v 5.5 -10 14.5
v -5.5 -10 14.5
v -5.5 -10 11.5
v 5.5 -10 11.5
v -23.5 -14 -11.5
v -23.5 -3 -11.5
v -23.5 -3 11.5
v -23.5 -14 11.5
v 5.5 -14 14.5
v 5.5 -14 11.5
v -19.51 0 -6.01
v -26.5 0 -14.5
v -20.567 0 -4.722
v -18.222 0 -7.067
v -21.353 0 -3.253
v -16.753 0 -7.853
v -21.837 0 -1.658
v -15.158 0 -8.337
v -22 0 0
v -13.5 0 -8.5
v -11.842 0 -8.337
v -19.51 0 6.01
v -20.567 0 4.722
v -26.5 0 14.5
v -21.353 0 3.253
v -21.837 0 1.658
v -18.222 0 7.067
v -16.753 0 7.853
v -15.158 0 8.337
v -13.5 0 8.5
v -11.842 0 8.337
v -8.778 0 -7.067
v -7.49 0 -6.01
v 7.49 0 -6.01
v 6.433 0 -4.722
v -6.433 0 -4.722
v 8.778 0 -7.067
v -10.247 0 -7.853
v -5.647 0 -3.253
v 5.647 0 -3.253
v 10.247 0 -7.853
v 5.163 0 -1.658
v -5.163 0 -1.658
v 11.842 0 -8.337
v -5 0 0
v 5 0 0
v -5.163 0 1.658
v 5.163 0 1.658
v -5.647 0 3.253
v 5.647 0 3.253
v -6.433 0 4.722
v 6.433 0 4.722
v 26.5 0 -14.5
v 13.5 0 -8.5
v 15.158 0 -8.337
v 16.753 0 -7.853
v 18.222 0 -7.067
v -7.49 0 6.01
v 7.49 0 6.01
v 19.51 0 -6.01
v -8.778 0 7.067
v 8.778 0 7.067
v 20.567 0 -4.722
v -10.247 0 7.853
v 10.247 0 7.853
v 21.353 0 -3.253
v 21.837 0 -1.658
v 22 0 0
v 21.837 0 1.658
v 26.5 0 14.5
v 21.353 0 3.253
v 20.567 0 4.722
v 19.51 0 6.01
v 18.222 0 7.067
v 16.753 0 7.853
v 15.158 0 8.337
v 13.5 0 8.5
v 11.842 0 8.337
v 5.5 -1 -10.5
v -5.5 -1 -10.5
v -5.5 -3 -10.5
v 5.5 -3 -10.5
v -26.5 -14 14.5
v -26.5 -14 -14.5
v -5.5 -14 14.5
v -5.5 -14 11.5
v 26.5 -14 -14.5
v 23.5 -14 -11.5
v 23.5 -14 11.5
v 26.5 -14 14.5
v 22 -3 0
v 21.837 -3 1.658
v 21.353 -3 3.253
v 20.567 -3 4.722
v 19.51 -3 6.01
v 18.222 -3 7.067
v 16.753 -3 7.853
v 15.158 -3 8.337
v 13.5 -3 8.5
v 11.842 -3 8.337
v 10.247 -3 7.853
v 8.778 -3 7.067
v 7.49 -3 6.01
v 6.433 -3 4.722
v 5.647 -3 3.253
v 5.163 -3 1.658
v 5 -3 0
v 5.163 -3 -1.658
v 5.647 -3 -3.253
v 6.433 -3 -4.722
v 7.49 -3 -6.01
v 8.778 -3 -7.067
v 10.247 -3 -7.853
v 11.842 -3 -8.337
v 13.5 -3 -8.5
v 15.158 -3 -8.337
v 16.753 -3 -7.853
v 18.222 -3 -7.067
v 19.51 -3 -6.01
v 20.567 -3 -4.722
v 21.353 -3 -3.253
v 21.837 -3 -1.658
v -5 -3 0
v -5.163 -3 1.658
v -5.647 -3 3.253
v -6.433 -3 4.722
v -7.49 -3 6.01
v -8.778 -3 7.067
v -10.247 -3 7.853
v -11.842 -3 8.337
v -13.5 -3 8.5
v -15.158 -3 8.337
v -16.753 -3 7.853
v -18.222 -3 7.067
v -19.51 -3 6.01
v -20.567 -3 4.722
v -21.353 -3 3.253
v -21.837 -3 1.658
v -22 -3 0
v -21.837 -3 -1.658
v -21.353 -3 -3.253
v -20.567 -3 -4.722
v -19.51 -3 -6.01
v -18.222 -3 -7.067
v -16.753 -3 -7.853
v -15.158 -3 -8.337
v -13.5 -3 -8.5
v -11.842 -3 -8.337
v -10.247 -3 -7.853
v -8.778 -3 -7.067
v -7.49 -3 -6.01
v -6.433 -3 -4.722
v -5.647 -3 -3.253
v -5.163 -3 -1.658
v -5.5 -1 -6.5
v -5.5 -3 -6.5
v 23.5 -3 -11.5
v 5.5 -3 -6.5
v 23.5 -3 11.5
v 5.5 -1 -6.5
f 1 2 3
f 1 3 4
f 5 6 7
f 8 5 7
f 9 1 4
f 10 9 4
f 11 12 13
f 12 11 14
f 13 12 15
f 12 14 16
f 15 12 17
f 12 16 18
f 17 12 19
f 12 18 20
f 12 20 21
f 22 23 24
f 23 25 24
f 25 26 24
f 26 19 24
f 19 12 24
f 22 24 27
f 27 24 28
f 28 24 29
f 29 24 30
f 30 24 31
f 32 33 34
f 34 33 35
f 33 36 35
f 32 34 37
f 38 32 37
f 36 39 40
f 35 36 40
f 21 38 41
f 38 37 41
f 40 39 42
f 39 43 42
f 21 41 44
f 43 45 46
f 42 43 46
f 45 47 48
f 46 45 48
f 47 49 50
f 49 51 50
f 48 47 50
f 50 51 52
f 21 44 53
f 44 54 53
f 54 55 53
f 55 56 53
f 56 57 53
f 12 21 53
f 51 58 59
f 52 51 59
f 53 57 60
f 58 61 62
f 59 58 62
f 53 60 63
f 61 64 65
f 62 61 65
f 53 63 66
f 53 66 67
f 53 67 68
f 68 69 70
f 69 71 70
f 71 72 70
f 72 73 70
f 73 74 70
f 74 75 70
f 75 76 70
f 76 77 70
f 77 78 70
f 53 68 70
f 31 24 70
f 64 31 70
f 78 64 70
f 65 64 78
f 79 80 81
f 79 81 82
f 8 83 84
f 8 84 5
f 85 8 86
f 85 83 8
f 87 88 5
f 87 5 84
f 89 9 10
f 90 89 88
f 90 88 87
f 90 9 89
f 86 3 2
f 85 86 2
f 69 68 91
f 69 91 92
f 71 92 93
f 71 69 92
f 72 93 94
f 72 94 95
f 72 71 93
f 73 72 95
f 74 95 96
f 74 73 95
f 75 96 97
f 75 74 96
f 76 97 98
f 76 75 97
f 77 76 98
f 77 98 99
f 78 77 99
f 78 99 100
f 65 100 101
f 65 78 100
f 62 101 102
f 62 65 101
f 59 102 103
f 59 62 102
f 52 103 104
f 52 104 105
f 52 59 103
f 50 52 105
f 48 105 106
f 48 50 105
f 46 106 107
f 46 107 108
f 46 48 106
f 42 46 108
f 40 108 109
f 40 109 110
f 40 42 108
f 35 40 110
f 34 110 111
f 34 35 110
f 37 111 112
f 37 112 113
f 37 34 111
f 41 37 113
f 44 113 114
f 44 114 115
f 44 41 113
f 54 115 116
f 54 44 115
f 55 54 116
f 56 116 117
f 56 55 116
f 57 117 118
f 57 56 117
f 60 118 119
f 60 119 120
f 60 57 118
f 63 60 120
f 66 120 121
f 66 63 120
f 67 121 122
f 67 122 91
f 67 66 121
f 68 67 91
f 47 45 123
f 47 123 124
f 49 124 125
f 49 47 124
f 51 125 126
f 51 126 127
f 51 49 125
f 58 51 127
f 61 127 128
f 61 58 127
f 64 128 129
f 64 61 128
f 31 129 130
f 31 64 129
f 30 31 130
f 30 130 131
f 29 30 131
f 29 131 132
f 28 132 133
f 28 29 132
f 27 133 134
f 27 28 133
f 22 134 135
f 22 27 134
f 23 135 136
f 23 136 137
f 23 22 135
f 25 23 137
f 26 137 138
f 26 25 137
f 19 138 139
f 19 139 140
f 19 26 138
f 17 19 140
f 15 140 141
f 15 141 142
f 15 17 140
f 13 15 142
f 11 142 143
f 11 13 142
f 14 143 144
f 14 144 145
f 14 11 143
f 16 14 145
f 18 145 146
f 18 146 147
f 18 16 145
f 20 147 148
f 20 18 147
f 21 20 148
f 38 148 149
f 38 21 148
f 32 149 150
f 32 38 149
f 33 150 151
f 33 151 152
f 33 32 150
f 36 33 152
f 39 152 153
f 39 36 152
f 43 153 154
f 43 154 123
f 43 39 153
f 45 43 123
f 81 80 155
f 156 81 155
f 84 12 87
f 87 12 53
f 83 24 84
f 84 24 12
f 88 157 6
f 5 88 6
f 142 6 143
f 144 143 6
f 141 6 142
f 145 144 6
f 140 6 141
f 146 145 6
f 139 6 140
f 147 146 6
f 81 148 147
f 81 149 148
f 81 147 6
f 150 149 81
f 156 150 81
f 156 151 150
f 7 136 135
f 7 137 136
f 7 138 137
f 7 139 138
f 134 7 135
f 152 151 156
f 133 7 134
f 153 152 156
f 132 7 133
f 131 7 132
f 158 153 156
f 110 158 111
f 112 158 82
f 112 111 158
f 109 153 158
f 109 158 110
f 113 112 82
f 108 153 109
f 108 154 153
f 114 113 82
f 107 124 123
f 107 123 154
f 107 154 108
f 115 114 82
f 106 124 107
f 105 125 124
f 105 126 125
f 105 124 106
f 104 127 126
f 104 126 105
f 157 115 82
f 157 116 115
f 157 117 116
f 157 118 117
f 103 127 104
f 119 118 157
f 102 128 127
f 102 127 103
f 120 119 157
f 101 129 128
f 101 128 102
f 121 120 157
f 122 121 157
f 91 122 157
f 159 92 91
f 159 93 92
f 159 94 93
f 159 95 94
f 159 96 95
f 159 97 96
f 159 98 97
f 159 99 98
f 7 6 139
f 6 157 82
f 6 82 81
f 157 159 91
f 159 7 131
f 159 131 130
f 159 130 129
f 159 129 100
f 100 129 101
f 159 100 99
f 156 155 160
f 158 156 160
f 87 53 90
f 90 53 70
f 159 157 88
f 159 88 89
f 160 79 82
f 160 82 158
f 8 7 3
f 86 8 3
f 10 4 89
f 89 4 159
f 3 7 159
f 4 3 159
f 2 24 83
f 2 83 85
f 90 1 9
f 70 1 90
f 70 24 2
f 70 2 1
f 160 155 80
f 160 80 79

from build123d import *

# Parameters (mm, degrees)
F0_W     = 11
F0_H     = 4
F0_R     = 8.5
F1_DEPTH = 3
F2_DEPTH = 1
F0_W_2   = 3
F0_H_2   = 23
F0_H_3   = 3
F3_DEPTH = 14
F4_DEPTH = 10


with BuildPart() as f1:
    # F0 (on Front) → F1 (new body)
    with BuildSketch(Plane.XZ):
        Polygon((-5.5, 11.5), (-23.5, 11.5), (-23.5, -11.5), (-5.5, -11.5), (5.5, -11.5), (23.5, -11.5), (23.5, 11.5), (5.5, 11.5), align=None)
        with Locations((0, -8.5)):
            Rectangle(F0_W, F0_H, mode=Mode.SUBTRACT)
        with Locations((-13.5, 0)):
            Circle(F0_R, mode=Mode.SUBTRACT)
        with Locations((13.5, 0)):
            Circle(F0_R, mode=Mode.SUBTRACT)
    extrude(amount=F1_DEPTH)

    # F0 (on Front) → F2 (join)
    with BuildSketch(Plane.XZ):
        with Locations((0, -8.5)):
            Rectangle(F0_W, F0_H)
    extrude(amount=F2_DEPTH)

    # F0 (on Front) → F3 (join)
    with BuildSketch(Plane.XZ):
        Polygon((-26.5, 11.5), (-23.5, 11.5), (-5.5, 11.5), (-5.5, 14.5), (-26.5, 14.5), align=None)
        Polygon((5.5, 14.5), (5.5, 11.5), (23.5, 11.5), (26.5, 11.5), (26.5, 14.5), align=None)
        with Locations((-25, 0)):
            Rectangle(F0_W_2, F0_H_2)
        Polygon((23.5, -11.5), (5.5, -11.5), (5.5, -14.5), (26.5, -14.5), (26.5, -11.5), align=None)
        Polygon((-5.5, -11.5), (-23.5, -11.5), (-26.5, -11.5), (-26.5, -14.5), (-5.5, -14.5), align=None)
        with Locations((25, 0)):
            Rectangle(F0_W_2, F0_H_2)
        with Locations((0, -13)):
            Rectangle(F0_W, F0_H_3)
    extrude(amount=F3_DEPTH)

    # F0 (on Front) → F4 (join)
    with BuildSketch(Plane.XZ):
        with Locations((0, 13)):
            Rectangle(F0_W, F0_H_3)
    extrude(amount=F4_DEPTH)


solid = f1.part
